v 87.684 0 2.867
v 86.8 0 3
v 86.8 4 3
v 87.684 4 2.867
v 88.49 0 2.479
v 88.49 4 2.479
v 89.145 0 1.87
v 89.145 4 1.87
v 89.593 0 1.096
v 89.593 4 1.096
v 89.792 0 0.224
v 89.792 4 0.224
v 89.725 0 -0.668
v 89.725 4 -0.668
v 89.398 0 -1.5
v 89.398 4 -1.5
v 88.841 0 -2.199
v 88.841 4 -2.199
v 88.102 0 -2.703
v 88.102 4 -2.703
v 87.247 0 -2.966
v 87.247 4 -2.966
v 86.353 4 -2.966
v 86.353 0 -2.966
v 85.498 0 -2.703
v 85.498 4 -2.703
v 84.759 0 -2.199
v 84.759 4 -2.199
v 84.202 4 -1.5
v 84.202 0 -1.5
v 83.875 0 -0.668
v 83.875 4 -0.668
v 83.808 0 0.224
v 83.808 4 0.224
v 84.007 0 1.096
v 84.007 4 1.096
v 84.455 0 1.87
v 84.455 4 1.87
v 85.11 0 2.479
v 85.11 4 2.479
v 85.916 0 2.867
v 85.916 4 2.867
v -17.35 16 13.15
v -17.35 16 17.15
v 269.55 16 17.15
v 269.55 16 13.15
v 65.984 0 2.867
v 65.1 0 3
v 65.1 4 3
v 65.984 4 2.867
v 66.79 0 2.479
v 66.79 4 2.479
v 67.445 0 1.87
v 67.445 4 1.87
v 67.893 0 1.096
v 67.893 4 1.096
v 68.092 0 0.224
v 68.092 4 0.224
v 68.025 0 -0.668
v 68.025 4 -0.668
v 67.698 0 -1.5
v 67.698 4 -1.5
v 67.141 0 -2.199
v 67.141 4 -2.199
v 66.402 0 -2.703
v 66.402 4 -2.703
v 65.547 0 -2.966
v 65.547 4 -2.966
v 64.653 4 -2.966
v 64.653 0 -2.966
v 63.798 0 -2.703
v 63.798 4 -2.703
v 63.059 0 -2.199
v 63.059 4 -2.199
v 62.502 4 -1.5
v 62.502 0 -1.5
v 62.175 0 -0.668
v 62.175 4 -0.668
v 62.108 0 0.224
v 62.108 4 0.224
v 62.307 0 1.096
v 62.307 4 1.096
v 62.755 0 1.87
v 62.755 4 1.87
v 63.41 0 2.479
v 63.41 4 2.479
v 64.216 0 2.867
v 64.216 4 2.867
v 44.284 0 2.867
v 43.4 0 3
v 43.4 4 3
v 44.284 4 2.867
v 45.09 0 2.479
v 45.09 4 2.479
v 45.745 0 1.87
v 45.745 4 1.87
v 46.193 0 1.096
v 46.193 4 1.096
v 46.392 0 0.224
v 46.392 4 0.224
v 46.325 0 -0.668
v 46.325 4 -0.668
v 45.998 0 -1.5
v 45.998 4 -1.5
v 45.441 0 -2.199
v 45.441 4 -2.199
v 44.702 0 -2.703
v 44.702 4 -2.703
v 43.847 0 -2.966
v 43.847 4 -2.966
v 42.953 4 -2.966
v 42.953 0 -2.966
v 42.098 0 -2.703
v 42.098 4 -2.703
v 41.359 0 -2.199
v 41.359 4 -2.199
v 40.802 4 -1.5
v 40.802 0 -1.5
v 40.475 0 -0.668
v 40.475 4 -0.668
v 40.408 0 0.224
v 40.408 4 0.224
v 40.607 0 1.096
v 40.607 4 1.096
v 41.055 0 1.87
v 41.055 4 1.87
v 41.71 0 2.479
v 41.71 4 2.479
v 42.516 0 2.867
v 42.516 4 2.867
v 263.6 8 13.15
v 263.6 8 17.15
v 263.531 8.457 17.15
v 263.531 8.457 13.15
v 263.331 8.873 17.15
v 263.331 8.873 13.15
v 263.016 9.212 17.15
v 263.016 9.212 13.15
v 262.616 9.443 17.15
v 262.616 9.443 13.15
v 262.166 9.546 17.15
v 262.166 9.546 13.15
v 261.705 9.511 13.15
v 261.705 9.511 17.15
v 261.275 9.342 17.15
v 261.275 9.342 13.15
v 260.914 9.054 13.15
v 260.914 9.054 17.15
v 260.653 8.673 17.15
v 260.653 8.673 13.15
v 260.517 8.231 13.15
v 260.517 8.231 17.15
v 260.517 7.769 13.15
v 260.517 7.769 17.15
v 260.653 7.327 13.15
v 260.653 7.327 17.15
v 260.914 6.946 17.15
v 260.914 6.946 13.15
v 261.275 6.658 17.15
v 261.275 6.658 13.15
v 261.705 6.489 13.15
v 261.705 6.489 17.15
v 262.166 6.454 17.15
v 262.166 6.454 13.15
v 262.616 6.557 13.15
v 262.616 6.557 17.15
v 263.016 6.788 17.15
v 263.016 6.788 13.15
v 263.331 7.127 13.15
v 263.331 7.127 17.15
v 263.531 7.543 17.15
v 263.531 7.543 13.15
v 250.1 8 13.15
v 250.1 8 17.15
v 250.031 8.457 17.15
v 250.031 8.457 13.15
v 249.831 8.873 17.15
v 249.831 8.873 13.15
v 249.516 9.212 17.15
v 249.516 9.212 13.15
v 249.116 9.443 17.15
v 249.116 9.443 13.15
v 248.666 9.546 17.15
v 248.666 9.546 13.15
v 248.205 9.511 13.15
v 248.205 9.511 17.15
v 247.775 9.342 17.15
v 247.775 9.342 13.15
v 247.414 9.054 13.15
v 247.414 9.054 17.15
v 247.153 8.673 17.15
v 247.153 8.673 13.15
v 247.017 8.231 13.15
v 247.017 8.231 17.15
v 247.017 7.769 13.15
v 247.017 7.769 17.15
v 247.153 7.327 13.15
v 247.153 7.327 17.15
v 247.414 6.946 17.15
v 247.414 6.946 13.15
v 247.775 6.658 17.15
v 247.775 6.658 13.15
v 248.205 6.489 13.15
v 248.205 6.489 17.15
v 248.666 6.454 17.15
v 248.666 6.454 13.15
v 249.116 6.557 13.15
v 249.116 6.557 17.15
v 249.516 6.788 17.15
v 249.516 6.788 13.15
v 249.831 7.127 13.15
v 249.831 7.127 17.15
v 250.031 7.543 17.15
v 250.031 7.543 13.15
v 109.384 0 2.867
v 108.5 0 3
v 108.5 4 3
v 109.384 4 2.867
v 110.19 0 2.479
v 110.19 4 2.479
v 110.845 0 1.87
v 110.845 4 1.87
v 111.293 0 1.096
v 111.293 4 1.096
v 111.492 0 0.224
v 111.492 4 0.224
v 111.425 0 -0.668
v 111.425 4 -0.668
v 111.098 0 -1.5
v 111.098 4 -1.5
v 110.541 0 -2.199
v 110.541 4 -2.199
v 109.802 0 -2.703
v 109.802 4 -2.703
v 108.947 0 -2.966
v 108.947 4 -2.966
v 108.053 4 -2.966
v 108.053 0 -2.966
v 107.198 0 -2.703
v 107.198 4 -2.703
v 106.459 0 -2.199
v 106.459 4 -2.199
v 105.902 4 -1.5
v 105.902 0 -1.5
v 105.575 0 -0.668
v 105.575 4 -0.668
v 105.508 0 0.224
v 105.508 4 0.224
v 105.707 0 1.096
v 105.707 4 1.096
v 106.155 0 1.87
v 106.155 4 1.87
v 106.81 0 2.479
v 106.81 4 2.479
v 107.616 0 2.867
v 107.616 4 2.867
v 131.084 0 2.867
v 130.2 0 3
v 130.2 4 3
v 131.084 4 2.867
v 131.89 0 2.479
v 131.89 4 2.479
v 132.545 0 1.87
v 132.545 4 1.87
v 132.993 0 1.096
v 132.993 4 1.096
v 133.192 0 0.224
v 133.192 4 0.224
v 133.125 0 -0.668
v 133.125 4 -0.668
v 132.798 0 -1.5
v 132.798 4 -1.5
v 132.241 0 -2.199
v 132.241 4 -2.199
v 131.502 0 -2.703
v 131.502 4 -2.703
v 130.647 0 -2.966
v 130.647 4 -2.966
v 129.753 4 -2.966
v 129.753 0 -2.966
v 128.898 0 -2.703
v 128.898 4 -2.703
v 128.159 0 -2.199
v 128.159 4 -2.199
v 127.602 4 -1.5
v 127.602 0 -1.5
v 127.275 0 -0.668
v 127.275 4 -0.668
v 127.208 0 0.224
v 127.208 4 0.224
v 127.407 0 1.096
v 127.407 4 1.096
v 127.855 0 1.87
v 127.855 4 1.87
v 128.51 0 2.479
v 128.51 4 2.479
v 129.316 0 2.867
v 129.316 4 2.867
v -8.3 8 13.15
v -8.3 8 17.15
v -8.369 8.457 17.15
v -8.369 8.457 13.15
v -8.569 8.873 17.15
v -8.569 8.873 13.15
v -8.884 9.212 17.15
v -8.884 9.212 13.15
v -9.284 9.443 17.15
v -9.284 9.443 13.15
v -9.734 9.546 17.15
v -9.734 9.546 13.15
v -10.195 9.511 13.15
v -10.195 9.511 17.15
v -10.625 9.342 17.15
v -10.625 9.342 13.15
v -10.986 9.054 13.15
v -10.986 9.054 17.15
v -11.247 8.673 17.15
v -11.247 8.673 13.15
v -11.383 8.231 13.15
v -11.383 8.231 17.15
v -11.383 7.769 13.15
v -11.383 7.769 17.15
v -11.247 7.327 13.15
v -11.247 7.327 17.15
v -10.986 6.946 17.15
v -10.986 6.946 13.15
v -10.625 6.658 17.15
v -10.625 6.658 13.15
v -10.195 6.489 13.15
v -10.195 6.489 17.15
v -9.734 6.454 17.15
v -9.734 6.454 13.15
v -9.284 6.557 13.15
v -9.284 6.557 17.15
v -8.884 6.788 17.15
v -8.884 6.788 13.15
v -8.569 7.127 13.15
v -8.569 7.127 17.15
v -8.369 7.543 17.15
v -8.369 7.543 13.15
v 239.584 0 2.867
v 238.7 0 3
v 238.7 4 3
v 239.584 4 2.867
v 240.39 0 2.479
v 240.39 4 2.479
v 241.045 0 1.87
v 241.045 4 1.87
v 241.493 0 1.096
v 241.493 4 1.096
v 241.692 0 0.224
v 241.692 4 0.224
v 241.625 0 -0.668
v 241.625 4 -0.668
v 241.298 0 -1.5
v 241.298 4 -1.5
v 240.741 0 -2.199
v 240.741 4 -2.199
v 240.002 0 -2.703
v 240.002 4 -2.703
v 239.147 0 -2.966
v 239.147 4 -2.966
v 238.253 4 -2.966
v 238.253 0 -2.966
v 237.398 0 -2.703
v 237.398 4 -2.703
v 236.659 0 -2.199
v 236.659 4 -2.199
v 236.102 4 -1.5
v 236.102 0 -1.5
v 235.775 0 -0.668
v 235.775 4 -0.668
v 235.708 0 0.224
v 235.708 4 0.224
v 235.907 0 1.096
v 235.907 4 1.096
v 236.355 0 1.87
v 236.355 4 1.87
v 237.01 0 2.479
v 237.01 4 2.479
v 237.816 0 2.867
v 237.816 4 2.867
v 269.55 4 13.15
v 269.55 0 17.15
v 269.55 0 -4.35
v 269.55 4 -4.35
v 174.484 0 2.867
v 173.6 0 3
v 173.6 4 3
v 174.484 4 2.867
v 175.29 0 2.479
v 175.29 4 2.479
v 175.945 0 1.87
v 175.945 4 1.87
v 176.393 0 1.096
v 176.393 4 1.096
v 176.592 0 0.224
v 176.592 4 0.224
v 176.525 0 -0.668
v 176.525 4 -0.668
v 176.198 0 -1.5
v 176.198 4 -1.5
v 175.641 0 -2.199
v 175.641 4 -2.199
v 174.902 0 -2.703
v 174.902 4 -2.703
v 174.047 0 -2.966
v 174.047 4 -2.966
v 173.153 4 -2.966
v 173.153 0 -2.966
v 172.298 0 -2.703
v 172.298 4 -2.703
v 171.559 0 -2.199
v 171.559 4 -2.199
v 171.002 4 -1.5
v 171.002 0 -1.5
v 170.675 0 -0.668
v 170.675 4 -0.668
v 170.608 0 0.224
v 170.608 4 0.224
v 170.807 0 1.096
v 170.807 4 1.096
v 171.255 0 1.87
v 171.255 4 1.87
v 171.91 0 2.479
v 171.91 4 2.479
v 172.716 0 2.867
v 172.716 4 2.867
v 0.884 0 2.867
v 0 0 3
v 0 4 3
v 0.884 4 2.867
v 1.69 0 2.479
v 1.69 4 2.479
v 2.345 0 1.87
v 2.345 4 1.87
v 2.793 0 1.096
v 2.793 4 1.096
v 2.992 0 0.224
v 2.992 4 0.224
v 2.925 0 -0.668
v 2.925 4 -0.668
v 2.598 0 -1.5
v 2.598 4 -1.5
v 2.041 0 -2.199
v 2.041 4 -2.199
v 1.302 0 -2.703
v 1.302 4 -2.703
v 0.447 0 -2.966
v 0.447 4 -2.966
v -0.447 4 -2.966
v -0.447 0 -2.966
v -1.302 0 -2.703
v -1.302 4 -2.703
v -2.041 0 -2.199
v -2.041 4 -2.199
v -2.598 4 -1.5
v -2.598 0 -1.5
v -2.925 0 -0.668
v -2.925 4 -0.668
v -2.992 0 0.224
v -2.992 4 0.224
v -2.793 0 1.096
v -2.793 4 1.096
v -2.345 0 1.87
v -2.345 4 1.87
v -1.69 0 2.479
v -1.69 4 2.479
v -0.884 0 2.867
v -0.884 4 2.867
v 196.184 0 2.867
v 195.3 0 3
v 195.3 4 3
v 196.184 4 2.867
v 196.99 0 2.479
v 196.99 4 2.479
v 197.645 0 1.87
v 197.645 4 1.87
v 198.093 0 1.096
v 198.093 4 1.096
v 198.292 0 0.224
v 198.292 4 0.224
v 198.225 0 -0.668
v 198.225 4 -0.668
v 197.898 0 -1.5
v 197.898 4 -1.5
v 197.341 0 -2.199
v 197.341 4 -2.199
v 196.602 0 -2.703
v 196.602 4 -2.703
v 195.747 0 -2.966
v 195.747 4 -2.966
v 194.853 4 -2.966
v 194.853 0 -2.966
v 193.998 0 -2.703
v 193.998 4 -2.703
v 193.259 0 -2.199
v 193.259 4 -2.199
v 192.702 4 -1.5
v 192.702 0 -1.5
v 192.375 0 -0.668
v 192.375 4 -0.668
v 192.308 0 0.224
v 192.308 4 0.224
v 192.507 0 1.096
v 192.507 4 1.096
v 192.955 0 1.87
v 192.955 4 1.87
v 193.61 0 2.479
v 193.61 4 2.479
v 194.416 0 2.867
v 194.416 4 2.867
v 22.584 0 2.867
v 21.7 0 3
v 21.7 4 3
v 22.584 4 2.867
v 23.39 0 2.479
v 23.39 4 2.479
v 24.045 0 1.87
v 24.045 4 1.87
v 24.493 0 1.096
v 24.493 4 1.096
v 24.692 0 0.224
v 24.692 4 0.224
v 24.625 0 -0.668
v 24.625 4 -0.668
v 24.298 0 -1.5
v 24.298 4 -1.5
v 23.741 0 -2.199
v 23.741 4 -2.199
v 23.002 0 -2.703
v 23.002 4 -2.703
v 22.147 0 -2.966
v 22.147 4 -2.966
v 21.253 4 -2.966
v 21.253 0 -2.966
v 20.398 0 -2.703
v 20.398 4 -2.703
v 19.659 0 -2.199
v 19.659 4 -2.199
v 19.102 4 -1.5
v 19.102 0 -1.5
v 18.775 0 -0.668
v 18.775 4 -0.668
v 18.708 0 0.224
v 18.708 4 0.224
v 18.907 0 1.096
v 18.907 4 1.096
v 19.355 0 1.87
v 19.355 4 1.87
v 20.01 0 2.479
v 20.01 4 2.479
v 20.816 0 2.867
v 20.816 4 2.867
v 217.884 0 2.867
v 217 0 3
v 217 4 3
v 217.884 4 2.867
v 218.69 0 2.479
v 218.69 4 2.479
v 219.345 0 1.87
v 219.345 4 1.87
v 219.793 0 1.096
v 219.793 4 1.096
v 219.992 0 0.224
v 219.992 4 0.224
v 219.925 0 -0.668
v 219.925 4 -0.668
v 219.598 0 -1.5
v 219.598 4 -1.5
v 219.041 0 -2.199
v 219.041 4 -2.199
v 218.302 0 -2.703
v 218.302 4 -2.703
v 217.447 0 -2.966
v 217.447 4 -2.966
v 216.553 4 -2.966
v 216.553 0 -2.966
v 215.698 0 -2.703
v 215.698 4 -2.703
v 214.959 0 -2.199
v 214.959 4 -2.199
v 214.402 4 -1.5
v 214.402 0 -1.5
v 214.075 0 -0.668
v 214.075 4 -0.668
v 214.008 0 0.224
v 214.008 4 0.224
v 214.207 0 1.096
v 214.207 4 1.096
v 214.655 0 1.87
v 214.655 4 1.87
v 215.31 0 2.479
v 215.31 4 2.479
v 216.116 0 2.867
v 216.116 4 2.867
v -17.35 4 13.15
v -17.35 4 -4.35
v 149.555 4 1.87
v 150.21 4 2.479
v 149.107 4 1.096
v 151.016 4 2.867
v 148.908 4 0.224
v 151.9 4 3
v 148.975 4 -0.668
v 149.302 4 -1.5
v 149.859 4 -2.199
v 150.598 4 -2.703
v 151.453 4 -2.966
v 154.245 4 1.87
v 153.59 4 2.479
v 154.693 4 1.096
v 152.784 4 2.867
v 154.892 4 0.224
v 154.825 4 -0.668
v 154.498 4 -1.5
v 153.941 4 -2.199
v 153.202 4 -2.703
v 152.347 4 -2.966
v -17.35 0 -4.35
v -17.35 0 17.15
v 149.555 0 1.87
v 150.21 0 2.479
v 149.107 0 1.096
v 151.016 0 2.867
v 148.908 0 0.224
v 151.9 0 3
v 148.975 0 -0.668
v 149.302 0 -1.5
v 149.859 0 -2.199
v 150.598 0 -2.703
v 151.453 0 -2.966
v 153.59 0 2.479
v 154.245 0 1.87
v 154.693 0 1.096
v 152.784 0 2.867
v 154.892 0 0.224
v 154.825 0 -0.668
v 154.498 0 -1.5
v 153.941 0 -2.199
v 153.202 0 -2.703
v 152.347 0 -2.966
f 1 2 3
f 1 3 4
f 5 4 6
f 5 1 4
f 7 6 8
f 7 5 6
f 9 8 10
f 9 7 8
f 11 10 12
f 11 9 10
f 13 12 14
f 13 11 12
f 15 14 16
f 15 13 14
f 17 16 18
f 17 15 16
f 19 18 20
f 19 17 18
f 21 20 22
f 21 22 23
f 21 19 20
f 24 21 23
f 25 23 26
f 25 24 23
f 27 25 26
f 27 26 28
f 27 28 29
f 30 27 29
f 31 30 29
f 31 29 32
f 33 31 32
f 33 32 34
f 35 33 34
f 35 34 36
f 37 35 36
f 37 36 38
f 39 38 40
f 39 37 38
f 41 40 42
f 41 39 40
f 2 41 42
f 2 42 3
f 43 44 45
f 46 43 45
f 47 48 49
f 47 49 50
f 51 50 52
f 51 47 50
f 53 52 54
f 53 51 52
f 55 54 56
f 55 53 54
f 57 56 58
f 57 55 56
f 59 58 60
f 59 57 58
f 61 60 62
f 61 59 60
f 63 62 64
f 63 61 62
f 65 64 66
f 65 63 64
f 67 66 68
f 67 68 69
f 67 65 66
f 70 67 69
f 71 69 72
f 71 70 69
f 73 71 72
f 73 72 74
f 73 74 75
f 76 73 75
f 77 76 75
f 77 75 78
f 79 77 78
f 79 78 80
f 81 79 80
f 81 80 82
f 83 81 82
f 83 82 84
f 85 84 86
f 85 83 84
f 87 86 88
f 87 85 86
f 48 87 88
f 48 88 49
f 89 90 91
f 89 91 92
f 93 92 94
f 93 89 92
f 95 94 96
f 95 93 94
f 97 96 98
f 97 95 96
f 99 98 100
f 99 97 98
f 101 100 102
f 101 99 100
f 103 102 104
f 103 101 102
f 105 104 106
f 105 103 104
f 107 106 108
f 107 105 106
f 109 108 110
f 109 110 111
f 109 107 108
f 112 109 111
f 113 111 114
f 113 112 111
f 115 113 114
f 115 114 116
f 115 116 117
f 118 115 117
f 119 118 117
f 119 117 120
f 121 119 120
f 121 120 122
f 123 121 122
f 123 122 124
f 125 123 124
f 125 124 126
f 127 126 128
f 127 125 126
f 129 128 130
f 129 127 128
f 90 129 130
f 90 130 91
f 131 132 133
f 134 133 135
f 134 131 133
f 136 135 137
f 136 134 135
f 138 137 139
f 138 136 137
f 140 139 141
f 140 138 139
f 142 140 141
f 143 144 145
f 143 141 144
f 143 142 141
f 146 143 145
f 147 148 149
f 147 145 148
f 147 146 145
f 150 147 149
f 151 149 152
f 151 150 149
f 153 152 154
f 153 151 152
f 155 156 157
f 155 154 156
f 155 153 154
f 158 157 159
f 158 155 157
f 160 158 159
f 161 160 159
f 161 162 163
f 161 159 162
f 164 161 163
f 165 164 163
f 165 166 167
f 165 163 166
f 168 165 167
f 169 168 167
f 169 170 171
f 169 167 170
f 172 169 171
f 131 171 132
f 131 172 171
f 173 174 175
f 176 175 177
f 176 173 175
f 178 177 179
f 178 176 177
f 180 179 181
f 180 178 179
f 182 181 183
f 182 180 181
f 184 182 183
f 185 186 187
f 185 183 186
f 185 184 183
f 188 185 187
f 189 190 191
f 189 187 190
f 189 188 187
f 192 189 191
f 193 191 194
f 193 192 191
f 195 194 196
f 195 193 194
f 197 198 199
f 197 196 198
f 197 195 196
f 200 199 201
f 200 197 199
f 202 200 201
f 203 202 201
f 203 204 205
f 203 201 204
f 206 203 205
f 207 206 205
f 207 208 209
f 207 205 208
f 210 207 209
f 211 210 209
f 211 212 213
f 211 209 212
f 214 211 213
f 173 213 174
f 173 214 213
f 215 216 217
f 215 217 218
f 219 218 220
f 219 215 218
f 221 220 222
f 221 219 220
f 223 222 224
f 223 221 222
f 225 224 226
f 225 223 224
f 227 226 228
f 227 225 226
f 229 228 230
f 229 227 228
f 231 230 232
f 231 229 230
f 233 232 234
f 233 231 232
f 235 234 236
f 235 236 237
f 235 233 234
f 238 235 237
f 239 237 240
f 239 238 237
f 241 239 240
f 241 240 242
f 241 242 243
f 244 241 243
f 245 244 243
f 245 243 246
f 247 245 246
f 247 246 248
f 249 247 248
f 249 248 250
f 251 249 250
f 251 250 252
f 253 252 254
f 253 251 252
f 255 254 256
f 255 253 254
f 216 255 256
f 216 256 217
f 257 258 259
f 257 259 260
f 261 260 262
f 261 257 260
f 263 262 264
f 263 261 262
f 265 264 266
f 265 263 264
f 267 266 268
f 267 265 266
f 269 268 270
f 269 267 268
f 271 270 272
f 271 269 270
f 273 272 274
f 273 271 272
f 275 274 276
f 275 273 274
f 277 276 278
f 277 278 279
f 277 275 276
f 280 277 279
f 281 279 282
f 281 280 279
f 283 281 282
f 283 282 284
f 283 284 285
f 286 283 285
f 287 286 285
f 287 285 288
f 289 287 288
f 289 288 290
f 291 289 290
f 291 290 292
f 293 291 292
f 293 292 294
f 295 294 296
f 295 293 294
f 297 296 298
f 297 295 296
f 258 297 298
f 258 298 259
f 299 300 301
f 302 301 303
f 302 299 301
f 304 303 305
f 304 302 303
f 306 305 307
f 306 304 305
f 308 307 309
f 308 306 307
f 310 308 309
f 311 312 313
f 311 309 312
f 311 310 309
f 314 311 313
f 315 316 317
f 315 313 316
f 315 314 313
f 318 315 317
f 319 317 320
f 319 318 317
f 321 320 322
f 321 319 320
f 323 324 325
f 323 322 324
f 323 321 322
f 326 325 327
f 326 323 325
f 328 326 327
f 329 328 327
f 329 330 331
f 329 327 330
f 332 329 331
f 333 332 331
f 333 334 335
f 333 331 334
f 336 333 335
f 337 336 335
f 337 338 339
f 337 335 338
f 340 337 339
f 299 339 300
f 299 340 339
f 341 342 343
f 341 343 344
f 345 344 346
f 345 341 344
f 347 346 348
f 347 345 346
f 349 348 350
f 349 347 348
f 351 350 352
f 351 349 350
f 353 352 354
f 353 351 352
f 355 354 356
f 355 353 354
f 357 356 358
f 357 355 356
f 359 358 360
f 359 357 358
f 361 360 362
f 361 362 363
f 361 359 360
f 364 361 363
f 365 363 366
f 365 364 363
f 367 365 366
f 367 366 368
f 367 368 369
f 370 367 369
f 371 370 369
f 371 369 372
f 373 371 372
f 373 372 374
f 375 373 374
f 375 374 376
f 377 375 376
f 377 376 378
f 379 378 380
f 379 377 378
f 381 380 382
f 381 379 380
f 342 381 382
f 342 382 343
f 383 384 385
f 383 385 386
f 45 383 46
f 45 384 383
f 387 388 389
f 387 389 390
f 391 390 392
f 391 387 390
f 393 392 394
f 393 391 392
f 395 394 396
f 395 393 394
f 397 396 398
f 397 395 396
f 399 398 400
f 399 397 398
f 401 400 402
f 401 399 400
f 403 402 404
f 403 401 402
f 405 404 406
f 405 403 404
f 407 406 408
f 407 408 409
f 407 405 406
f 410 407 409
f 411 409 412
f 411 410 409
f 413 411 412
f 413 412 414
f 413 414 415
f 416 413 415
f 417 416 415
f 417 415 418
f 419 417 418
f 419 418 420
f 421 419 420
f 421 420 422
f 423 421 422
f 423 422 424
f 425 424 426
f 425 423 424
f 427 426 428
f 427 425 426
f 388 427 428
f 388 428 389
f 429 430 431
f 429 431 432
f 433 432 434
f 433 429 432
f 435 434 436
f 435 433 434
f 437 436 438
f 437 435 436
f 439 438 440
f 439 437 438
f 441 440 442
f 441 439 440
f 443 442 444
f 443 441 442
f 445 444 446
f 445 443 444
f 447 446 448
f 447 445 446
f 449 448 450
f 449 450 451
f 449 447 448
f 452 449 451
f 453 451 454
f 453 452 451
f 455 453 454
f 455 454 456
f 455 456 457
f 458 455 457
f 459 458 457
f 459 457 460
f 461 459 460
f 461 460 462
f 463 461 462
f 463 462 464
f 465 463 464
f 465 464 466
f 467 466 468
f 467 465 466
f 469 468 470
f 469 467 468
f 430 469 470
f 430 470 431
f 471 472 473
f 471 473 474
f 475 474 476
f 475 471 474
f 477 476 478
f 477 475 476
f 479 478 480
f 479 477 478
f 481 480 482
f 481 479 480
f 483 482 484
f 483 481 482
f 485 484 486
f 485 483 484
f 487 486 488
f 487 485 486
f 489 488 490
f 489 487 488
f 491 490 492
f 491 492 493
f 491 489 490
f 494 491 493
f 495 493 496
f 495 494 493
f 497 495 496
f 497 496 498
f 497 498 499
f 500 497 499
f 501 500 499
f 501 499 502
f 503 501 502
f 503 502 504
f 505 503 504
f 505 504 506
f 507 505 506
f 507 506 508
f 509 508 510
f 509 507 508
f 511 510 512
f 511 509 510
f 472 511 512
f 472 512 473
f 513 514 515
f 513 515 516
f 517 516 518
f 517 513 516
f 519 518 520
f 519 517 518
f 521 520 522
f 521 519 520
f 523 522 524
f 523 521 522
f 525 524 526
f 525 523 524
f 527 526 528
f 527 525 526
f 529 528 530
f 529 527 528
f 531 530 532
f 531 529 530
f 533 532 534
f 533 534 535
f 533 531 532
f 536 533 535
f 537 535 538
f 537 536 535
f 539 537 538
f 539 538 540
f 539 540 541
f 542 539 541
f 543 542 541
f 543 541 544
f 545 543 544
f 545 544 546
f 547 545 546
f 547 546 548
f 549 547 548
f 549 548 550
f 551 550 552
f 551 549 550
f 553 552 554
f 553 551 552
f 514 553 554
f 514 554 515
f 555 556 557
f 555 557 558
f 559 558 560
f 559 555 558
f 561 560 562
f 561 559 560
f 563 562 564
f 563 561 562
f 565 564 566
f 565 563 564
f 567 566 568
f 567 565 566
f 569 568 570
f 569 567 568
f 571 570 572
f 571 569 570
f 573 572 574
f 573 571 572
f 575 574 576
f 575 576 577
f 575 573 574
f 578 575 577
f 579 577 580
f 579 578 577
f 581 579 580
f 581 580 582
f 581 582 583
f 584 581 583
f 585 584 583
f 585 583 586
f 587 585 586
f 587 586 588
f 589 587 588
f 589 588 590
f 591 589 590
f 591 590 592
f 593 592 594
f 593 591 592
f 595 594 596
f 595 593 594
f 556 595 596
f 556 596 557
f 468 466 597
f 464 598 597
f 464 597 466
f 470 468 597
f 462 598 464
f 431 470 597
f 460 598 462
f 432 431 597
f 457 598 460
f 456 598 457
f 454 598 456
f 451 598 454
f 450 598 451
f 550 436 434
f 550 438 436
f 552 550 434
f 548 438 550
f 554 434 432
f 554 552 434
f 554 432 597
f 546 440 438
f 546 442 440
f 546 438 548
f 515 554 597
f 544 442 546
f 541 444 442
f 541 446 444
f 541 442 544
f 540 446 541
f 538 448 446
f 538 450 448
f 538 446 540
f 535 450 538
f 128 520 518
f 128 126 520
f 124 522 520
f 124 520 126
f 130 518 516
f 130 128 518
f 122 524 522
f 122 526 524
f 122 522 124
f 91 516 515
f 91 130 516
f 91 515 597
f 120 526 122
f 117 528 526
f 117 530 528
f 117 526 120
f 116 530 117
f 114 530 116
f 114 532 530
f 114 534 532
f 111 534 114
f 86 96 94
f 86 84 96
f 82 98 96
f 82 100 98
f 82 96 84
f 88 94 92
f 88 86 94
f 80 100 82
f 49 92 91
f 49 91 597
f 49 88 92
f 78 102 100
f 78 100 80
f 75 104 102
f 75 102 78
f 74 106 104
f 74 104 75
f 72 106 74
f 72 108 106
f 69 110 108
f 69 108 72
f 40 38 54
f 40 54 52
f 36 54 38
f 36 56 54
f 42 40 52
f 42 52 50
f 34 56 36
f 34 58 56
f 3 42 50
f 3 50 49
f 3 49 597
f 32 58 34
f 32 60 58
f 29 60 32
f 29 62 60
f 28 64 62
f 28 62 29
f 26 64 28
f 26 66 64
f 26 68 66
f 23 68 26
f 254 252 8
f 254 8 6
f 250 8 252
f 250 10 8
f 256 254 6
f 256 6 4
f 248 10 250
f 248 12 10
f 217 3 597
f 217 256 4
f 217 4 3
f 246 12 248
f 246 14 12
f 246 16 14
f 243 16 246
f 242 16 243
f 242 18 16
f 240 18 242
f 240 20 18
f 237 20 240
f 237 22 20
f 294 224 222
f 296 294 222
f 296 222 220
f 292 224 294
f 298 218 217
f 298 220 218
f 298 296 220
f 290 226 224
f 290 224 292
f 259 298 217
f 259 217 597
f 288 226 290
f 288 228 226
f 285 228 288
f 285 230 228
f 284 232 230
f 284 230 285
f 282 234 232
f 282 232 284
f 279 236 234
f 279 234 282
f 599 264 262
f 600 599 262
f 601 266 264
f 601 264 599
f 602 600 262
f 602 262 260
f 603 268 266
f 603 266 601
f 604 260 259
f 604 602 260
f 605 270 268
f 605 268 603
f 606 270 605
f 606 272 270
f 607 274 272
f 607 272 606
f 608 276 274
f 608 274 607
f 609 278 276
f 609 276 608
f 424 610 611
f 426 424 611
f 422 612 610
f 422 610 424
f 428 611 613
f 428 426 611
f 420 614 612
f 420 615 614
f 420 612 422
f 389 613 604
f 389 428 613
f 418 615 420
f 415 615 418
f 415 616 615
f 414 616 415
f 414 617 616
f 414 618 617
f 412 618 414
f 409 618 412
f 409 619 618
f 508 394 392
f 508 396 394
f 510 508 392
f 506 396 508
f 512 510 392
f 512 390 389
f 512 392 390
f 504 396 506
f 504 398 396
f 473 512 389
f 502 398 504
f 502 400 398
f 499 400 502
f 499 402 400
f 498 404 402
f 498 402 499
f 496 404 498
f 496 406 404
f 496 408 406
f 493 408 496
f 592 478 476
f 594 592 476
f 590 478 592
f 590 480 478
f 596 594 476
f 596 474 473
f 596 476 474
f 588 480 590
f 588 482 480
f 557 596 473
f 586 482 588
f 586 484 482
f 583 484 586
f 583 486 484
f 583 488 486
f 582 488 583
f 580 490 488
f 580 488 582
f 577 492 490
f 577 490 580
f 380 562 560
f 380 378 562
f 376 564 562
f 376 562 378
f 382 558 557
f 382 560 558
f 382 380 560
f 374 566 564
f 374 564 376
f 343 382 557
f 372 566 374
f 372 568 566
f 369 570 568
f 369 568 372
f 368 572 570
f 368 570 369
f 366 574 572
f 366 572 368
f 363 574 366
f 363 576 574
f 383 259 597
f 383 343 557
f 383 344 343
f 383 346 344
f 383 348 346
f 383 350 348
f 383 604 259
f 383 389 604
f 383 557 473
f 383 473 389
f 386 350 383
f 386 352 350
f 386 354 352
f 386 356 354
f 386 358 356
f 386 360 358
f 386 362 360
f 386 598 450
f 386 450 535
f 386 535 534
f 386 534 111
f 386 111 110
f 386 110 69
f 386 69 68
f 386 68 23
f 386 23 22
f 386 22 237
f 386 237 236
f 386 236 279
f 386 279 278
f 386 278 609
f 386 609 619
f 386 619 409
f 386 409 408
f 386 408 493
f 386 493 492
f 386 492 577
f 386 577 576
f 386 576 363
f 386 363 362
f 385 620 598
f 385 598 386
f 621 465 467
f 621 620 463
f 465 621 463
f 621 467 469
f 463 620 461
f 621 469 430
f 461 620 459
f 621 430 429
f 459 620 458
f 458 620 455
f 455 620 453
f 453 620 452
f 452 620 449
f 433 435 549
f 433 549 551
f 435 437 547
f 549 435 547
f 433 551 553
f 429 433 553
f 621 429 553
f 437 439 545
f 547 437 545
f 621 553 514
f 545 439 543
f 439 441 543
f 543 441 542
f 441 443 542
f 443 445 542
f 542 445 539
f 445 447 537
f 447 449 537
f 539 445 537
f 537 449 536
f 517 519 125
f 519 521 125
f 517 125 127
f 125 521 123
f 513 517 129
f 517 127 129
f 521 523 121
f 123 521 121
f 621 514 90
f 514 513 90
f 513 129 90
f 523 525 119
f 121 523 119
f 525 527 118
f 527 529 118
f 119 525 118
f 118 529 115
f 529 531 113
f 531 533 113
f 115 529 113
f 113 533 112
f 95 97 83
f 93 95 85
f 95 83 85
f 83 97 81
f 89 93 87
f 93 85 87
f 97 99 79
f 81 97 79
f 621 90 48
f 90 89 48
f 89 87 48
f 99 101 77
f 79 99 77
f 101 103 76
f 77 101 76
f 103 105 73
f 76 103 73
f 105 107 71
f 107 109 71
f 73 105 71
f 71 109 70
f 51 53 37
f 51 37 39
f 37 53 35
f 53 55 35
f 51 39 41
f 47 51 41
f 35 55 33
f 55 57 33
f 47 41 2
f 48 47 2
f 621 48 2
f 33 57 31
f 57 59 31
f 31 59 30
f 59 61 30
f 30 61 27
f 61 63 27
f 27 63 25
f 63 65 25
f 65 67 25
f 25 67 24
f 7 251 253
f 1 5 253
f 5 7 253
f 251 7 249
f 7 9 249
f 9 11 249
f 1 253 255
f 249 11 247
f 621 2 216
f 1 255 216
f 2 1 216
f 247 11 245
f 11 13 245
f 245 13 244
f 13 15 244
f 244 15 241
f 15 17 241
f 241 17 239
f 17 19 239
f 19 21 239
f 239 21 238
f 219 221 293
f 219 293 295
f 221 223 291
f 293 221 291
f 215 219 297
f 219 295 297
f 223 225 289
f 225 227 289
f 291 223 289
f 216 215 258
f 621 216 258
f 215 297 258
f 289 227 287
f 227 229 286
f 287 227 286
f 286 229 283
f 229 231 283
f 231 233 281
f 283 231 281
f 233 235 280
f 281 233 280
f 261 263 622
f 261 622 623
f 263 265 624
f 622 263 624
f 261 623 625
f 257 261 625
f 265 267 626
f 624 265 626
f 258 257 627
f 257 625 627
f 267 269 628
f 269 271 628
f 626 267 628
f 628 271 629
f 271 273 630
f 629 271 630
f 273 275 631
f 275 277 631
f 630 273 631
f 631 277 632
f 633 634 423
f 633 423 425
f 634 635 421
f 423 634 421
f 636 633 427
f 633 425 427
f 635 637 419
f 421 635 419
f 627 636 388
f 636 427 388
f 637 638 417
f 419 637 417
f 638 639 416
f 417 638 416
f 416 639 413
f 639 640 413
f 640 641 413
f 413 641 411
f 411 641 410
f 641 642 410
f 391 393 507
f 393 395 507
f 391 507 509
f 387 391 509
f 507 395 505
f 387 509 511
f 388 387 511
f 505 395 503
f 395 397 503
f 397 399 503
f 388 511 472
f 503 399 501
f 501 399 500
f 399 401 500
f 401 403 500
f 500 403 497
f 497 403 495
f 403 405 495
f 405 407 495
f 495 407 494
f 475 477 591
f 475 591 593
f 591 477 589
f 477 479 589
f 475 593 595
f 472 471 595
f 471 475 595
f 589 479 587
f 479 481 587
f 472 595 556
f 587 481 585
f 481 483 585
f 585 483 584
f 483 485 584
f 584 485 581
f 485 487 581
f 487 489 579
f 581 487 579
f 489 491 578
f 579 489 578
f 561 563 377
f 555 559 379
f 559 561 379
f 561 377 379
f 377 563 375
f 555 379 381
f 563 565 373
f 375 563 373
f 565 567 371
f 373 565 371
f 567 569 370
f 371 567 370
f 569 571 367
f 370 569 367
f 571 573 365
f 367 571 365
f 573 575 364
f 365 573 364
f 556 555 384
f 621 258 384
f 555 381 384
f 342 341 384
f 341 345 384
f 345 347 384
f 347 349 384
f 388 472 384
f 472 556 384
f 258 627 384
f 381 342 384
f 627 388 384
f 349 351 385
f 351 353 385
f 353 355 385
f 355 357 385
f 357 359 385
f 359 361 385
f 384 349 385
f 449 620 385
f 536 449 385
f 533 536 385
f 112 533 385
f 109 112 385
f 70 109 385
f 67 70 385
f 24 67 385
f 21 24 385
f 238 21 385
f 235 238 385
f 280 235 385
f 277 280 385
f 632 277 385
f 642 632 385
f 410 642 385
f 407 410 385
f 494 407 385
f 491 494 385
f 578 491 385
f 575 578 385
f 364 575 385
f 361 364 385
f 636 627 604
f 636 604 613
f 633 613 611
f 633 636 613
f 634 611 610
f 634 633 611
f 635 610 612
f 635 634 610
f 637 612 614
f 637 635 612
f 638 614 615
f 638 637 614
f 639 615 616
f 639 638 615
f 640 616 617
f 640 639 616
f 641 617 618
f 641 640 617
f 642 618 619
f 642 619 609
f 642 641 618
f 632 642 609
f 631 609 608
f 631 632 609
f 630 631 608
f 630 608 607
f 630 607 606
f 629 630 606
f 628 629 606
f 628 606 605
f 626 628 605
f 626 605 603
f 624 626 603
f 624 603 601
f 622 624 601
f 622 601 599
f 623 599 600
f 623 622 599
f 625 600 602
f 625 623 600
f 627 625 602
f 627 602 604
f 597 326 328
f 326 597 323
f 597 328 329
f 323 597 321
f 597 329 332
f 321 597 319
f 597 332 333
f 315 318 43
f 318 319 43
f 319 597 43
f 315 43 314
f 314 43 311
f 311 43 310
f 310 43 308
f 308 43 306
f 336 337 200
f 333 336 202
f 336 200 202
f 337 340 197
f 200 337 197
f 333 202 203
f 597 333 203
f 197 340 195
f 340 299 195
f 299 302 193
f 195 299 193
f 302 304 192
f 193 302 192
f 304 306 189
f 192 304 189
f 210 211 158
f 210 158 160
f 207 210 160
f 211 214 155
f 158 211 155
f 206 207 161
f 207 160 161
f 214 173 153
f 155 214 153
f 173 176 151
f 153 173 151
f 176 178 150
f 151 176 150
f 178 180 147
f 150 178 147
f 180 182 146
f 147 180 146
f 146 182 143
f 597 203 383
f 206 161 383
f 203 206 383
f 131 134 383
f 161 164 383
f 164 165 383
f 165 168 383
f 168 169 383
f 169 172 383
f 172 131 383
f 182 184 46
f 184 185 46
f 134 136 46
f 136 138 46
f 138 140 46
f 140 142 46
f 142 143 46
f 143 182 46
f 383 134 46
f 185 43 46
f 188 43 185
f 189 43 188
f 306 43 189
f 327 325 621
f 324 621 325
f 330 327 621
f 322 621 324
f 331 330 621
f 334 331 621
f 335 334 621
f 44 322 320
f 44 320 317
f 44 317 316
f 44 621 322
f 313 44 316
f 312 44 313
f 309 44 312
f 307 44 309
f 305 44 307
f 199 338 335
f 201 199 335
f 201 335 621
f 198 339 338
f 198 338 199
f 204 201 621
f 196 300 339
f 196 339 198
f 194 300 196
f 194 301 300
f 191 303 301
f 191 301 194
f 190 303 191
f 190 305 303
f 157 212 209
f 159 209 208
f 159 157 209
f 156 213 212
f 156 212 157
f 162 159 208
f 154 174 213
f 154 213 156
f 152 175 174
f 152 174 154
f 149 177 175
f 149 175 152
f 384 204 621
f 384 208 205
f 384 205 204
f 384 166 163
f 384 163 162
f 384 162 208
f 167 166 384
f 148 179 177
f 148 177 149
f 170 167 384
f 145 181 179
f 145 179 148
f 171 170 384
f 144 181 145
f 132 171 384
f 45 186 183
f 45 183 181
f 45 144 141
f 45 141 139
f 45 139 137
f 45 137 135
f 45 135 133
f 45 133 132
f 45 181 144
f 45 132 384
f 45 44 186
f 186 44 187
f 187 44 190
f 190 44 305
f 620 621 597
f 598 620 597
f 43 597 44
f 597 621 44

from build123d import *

# Parameters (mm, degrees)
SKETCH1_W           = 286.9
SKETCH1_H           = 21.5
SKETCH1_R           = 3
BOSS_EXTRUDE1_DEPTH = 4
SKETCH2_W           = 286.9
SKETCH2_H           = 12
BOSS_EXTRUDE2_DEPTH = 4
SKETCH6_R           = 1.55
CUT_EXTRUDE4_DEPTH  = 271.248330559


with BuildPart() as part:
    # Sketch1 → Boss-Extrude1 (new body)
    with BuildSketch(Plane(origin=(0, 0, 0), x_dir=(1, 0, 0), z_dir=(0, 1, 0))):
        with Locations((126.1, -6.4)):
            Rectangle(SKETCH1_W, SKETCH1_H)
        with Locations(Location((0, 0, 0), (0, 0, 270))):
            Circle(SKETCH1_R, mode=Mode.SUBTRACT)
        with Locations(Location((21.7, 0, 0), (0, 0, 270))):
            Circle(SKETCH1_R, mode=Mode.SUBTRACT)
        with Locations(Location((43.4, 0, 0), (0, 0, 270))):
            Circle(SKETCH1_R, mode=Mode.SUBTRACT)
        with Locations(Location((65.1, 0, 0), (0, 0, 270))):
            Circle(SKETCH1_R, mode=Mode.SUBTRACT)
        with Locations(Location((86.8, 0, 0), (0, 0, 270))):
            Circle(SKETCH1_R, mode=Mode.SUBTRACT)
        with Locations(Location((108.5, 0, 0), (0, 0, 270))):
            Circle(SKETCH1_R, mode=Mode.SUBTRACT)
        with Locations(Location((130.2, 0, 0), (0, 0, 270))):
            Circle(SKETCH1_R, mode=Mode.SUBTRACT)
        with Locations(Location((151.9, 0, 0), (0, 0, 270))):
            Circle(SKETCH1_R, mode=Mode.SUBTRACT)
        with Locations(Location((173.6, 0, 0), (0, 0, 270))):
            Circle(SKETCH1_R, mode=Mode.SUBTRACT)
        with Locations(Location((195.3, 0, 0), (0, 0, 270))):
            Circle(SKETCH1_R, mode=Mode.SUBTRACT)
        with Locations(Location((217, 0, 0), (0, 0, 270))):
            Circle(SKETCH1_R, mode=Mode.SUBTRACT)
        with Locations(Location((238.7, 0, 0), (0, 0, 270))):
            Circle(SKETCH1_R, mode=Mode.SUBTRACT)
    extrude(amount=BOSS_EXTRUDE1_DEPTH)

    # Sketch2 → Boss-Extrude2 (add)
    with BuildSketch(Plane.XY.offset(17.15)):
        with Locations((126.1, 10)):
            Rectangle(SKETCH2_W, SKETCH2_H)
    extrude(amount=-BOSS_EXTRUDE2_DEPTH)

    # Sketch6 → Cut-Extrude4 (cut, through all)
    with BuildSketch(Plane(origin=(0, 8.408785298, 13.15), x_dir=(-1, 0, 0), z_dir=(0, 0, 1))):
        with Locations(Location((-262.05, 0.408785298, 0), (0, 0, 180))):
            Circle(SKETCH6_R)
        with Locations(Location((-248.55, 0.408785298, 0), (0, 0, 180))):
            Circle(SKETCH6_R)
        with Locations(Location((9.85, 0.408785298, 0), (0, 0, 180))):
            Circle(SKETCH6_R)
    extrude(amount=CUT_EXTRUDE4_DEPTH, mode=Mode.SUBTRACT)


solid = part.part
